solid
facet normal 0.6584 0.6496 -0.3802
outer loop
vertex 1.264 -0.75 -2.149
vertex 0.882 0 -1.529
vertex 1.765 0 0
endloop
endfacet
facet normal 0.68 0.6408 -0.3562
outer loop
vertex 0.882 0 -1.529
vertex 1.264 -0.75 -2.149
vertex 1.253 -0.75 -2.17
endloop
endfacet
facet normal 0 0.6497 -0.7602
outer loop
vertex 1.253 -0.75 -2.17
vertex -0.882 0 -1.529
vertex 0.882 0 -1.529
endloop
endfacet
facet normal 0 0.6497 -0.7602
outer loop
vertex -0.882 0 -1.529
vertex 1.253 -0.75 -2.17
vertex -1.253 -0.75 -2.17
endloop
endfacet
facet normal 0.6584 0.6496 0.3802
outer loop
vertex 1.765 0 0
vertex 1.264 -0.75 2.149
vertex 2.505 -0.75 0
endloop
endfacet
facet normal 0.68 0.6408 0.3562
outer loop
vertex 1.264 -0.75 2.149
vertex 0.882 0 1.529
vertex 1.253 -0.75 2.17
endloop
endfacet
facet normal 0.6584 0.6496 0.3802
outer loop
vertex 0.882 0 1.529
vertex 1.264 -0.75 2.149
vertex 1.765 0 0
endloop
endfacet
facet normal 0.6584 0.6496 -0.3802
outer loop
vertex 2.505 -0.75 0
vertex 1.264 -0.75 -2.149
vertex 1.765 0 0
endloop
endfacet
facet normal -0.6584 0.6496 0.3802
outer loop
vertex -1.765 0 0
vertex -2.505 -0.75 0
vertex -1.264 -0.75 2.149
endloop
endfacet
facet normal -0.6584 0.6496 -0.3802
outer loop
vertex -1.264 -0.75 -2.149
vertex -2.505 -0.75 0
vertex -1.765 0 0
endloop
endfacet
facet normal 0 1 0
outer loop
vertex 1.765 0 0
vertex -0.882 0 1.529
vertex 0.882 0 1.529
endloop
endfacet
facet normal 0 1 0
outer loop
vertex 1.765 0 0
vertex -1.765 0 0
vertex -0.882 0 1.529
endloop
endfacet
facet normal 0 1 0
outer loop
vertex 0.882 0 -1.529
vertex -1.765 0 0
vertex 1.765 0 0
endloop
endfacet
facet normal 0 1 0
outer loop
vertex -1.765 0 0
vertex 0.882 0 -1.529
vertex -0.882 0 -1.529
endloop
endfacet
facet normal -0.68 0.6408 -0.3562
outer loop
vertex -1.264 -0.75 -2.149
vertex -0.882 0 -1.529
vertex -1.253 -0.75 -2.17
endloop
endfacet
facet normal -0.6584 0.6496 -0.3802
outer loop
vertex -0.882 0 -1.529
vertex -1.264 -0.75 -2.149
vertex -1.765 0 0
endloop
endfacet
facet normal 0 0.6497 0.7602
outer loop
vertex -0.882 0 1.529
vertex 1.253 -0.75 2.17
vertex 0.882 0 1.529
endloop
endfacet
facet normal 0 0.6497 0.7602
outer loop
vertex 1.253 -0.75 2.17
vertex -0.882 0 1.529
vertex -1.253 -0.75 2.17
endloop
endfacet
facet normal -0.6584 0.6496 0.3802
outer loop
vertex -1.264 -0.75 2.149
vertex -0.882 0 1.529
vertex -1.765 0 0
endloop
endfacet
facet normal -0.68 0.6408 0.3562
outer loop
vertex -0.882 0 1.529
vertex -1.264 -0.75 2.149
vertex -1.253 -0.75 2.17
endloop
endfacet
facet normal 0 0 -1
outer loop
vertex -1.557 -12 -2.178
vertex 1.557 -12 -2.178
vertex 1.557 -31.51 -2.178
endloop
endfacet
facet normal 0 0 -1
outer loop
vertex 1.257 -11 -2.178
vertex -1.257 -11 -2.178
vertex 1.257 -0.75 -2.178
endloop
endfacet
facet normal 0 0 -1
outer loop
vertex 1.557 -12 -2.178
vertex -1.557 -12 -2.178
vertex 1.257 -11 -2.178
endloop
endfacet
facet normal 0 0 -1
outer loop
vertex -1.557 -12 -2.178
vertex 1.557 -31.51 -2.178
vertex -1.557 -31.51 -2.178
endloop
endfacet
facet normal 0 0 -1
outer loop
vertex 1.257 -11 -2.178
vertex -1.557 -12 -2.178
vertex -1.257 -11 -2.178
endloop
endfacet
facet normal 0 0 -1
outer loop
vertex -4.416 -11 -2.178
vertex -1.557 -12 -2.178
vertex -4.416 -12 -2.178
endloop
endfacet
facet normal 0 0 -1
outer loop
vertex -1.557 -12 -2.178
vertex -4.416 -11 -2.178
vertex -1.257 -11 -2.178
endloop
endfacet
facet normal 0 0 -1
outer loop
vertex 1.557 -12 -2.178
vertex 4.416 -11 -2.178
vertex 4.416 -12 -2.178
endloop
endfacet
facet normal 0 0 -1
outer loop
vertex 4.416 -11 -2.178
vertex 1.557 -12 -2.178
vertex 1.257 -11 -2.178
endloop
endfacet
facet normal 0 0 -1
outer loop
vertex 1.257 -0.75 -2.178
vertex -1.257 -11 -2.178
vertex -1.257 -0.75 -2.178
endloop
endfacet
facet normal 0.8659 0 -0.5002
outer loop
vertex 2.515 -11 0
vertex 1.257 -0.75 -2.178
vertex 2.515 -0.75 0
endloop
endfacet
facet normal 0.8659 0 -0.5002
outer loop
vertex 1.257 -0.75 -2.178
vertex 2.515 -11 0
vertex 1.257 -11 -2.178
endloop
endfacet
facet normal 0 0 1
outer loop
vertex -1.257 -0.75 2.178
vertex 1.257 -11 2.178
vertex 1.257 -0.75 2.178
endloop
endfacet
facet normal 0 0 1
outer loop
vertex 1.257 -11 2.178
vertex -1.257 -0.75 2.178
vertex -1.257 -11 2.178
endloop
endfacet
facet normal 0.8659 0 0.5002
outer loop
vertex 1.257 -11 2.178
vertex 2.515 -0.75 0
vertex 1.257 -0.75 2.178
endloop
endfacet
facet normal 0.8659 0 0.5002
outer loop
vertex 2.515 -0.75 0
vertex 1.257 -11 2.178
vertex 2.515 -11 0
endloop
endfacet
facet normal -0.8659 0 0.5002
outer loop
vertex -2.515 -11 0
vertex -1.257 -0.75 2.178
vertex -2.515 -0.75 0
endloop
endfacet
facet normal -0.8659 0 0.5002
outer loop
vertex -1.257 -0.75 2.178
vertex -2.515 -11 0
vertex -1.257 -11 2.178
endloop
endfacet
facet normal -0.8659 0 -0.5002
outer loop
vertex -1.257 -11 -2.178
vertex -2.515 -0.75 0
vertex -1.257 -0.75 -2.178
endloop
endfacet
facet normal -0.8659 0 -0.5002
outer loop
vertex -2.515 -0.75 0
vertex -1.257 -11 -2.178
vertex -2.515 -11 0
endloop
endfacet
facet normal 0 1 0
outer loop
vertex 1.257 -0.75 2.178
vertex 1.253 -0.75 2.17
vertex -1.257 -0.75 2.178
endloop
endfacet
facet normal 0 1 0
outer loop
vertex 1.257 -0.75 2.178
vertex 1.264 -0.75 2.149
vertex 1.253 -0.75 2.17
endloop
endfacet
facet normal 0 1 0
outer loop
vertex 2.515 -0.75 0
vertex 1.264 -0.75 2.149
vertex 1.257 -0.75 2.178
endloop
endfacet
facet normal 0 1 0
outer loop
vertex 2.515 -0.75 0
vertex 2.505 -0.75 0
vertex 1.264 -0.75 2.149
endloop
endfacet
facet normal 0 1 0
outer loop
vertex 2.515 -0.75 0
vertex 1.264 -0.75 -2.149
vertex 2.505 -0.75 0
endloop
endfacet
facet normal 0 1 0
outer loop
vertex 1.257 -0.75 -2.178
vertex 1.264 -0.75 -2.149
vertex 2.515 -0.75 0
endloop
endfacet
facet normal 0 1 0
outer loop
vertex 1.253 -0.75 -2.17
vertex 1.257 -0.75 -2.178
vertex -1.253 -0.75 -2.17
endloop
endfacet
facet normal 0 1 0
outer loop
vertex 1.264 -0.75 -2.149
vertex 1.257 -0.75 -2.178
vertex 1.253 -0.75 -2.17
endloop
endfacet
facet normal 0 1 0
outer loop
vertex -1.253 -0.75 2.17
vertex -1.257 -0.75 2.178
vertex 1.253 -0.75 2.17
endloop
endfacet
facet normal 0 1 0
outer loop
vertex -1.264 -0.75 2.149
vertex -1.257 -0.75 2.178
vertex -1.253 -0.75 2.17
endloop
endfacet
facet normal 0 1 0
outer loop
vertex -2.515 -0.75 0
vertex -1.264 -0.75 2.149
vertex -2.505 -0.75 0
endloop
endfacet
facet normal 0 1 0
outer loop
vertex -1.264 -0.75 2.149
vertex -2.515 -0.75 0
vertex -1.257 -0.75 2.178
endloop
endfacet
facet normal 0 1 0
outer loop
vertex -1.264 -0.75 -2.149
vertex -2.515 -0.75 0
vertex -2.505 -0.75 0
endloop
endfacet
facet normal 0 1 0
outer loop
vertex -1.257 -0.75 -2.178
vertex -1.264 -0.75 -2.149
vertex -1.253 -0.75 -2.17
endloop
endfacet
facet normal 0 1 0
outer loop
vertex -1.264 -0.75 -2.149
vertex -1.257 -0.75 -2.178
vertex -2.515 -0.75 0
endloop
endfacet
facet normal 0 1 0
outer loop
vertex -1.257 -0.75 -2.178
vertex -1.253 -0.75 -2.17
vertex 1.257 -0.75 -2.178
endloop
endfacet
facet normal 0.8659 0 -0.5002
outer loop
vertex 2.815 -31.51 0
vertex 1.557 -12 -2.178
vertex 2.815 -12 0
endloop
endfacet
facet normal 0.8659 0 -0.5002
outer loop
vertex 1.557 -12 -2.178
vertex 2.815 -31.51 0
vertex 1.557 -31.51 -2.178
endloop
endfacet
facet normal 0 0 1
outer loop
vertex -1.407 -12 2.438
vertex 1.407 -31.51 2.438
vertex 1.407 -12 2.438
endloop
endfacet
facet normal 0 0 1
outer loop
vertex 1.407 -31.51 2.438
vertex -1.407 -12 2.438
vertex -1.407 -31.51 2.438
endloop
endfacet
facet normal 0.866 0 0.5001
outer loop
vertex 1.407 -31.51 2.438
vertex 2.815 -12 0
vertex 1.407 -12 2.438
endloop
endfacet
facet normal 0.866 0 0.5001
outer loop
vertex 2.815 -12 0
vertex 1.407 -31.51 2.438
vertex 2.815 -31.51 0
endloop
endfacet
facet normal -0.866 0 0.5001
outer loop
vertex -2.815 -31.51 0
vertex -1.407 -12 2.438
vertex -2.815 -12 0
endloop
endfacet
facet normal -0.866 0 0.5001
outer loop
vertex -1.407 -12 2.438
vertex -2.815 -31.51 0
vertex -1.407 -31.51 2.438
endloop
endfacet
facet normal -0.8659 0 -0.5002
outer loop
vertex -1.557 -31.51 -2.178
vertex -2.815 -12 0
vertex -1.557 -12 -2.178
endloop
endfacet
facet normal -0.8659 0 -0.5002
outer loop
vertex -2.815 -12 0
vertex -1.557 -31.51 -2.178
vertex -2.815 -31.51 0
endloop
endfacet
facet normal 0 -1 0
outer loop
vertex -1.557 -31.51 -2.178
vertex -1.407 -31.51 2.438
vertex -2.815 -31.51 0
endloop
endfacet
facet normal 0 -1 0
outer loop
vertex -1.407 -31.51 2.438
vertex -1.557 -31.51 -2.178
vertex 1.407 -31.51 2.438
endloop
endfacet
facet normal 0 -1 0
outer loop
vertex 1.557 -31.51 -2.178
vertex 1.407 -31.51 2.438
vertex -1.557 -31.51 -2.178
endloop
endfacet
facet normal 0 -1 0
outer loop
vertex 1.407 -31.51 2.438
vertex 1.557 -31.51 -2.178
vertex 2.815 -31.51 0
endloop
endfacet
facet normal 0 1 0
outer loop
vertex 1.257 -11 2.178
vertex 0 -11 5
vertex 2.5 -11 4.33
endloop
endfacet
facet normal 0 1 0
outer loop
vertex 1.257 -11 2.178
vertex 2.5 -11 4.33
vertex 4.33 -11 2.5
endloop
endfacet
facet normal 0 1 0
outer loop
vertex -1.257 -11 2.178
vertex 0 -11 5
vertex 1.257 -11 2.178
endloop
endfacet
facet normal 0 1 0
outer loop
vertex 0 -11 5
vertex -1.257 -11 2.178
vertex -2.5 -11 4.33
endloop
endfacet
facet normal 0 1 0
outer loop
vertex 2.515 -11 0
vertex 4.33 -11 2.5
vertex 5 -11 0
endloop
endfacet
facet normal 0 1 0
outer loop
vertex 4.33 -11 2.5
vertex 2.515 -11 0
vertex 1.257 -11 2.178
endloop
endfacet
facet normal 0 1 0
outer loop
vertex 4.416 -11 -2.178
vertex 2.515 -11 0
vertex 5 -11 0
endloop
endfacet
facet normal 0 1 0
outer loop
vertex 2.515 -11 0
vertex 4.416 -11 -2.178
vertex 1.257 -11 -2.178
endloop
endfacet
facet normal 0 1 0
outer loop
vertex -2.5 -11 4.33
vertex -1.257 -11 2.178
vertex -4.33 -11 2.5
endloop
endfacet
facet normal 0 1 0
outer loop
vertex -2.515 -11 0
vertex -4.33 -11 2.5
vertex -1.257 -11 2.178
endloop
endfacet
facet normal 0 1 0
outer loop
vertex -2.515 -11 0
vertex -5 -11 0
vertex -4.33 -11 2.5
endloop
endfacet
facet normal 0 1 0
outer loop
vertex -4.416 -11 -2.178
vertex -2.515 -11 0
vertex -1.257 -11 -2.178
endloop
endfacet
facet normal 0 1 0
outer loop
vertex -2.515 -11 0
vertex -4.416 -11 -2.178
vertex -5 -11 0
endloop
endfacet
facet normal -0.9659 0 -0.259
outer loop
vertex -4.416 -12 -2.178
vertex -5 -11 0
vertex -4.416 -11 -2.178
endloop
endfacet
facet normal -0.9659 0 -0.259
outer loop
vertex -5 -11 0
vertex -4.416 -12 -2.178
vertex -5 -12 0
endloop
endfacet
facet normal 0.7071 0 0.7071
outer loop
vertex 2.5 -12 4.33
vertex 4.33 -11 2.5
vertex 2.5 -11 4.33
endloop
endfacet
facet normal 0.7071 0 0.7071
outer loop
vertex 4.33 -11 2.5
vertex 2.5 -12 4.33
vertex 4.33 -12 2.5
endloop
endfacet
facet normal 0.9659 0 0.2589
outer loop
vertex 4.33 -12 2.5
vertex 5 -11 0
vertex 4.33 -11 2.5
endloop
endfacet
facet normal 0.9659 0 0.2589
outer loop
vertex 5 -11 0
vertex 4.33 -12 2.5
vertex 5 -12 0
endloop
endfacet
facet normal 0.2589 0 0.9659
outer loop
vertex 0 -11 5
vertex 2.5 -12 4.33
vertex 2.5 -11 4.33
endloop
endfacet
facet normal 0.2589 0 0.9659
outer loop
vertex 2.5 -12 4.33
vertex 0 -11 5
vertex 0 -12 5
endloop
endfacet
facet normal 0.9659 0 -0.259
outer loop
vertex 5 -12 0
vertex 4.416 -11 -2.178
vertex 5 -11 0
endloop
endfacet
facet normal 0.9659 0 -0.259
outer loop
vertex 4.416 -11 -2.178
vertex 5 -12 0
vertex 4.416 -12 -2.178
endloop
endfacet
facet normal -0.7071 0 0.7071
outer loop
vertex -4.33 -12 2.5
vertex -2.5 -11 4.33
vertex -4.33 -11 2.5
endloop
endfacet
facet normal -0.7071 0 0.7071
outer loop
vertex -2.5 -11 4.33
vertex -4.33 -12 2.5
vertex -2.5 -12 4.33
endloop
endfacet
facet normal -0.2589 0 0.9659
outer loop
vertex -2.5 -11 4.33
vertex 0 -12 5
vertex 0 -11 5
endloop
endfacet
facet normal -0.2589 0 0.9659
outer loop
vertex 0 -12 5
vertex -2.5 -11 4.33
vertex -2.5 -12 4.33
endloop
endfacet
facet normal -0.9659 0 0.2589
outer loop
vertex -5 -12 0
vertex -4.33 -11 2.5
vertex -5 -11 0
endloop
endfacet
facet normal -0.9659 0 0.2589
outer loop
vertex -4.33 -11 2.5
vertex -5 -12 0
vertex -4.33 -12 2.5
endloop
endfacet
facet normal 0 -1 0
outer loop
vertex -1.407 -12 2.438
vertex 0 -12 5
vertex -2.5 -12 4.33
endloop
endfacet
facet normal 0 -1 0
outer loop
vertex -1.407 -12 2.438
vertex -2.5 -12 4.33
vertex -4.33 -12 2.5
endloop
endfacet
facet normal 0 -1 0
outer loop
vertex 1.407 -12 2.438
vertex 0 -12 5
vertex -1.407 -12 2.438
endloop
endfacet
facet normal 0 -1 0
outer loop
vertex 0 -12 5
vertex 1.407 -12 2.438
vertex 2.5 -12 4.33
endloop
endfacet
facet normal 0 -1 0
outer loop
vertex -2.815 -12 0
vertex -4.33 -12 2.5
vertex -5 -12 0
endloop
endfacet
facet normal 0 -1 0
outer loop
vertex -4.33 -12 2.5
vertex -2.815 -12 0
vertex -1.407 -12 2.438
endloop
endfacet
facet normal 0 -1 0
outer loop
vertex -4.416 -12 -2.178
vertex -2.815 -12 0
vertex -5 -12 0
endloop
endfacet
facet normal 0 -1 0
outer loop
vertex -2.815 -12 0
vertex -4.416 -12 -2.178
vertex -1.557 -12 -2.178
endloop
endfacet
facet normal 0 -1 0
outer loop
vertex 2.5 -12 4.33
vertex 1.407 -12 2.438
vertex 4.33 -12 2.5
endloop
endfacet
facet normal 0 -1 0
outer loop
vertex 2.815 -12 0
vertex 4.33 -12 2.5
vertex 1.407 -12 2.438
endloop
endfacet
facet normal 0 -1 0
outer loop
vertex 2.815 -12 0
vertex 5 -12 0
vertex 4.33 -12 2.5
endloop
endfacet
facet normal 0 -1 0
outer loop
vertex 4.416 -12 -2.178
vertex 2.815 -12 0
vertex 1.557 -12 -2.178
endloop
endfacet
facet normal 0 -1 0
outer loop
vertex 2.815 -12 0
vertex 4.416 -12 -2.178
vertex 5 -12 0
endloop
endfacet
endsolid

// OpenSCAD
d = 5.63-0.6;
d2 = 5.63;
l1 = 11;
l2 = 21;
w = 10;
t = 1;
chamfer = 0.75;

nudge = 0.01;
rotate([90,0,0])
render(convexity=3) 
    intersection() {
        union() {
        cylinder(h=chamfer+nudge, d1=d-2*chamfer, d2=d, $fn=6);
        translate([0,0,chamfer])
        cylinder(h=l1-chamfer+nudge, d=d, $fn=6);
        translate([0,0,l1])
        cylinder(h=l2+t-2*chamfer+nudge, d=d2, $fn=6);
        translate([0,0,l1+l2+t-chamfer])
        cylinder(h=chamfer+nudge, d1=d2, d2=d2-2*chamfer, $fn=6);
        
        //cylinder(h=l1+l2+1, d=d, $fn=6);
        translate([0,0,l1])
            cylinder(h=1, d=w, $fn=12);
        }
    translate([-w,-d/2*cos(180/6),-1]) cube([2*w,2*w,l1+l2+t]);
    }
